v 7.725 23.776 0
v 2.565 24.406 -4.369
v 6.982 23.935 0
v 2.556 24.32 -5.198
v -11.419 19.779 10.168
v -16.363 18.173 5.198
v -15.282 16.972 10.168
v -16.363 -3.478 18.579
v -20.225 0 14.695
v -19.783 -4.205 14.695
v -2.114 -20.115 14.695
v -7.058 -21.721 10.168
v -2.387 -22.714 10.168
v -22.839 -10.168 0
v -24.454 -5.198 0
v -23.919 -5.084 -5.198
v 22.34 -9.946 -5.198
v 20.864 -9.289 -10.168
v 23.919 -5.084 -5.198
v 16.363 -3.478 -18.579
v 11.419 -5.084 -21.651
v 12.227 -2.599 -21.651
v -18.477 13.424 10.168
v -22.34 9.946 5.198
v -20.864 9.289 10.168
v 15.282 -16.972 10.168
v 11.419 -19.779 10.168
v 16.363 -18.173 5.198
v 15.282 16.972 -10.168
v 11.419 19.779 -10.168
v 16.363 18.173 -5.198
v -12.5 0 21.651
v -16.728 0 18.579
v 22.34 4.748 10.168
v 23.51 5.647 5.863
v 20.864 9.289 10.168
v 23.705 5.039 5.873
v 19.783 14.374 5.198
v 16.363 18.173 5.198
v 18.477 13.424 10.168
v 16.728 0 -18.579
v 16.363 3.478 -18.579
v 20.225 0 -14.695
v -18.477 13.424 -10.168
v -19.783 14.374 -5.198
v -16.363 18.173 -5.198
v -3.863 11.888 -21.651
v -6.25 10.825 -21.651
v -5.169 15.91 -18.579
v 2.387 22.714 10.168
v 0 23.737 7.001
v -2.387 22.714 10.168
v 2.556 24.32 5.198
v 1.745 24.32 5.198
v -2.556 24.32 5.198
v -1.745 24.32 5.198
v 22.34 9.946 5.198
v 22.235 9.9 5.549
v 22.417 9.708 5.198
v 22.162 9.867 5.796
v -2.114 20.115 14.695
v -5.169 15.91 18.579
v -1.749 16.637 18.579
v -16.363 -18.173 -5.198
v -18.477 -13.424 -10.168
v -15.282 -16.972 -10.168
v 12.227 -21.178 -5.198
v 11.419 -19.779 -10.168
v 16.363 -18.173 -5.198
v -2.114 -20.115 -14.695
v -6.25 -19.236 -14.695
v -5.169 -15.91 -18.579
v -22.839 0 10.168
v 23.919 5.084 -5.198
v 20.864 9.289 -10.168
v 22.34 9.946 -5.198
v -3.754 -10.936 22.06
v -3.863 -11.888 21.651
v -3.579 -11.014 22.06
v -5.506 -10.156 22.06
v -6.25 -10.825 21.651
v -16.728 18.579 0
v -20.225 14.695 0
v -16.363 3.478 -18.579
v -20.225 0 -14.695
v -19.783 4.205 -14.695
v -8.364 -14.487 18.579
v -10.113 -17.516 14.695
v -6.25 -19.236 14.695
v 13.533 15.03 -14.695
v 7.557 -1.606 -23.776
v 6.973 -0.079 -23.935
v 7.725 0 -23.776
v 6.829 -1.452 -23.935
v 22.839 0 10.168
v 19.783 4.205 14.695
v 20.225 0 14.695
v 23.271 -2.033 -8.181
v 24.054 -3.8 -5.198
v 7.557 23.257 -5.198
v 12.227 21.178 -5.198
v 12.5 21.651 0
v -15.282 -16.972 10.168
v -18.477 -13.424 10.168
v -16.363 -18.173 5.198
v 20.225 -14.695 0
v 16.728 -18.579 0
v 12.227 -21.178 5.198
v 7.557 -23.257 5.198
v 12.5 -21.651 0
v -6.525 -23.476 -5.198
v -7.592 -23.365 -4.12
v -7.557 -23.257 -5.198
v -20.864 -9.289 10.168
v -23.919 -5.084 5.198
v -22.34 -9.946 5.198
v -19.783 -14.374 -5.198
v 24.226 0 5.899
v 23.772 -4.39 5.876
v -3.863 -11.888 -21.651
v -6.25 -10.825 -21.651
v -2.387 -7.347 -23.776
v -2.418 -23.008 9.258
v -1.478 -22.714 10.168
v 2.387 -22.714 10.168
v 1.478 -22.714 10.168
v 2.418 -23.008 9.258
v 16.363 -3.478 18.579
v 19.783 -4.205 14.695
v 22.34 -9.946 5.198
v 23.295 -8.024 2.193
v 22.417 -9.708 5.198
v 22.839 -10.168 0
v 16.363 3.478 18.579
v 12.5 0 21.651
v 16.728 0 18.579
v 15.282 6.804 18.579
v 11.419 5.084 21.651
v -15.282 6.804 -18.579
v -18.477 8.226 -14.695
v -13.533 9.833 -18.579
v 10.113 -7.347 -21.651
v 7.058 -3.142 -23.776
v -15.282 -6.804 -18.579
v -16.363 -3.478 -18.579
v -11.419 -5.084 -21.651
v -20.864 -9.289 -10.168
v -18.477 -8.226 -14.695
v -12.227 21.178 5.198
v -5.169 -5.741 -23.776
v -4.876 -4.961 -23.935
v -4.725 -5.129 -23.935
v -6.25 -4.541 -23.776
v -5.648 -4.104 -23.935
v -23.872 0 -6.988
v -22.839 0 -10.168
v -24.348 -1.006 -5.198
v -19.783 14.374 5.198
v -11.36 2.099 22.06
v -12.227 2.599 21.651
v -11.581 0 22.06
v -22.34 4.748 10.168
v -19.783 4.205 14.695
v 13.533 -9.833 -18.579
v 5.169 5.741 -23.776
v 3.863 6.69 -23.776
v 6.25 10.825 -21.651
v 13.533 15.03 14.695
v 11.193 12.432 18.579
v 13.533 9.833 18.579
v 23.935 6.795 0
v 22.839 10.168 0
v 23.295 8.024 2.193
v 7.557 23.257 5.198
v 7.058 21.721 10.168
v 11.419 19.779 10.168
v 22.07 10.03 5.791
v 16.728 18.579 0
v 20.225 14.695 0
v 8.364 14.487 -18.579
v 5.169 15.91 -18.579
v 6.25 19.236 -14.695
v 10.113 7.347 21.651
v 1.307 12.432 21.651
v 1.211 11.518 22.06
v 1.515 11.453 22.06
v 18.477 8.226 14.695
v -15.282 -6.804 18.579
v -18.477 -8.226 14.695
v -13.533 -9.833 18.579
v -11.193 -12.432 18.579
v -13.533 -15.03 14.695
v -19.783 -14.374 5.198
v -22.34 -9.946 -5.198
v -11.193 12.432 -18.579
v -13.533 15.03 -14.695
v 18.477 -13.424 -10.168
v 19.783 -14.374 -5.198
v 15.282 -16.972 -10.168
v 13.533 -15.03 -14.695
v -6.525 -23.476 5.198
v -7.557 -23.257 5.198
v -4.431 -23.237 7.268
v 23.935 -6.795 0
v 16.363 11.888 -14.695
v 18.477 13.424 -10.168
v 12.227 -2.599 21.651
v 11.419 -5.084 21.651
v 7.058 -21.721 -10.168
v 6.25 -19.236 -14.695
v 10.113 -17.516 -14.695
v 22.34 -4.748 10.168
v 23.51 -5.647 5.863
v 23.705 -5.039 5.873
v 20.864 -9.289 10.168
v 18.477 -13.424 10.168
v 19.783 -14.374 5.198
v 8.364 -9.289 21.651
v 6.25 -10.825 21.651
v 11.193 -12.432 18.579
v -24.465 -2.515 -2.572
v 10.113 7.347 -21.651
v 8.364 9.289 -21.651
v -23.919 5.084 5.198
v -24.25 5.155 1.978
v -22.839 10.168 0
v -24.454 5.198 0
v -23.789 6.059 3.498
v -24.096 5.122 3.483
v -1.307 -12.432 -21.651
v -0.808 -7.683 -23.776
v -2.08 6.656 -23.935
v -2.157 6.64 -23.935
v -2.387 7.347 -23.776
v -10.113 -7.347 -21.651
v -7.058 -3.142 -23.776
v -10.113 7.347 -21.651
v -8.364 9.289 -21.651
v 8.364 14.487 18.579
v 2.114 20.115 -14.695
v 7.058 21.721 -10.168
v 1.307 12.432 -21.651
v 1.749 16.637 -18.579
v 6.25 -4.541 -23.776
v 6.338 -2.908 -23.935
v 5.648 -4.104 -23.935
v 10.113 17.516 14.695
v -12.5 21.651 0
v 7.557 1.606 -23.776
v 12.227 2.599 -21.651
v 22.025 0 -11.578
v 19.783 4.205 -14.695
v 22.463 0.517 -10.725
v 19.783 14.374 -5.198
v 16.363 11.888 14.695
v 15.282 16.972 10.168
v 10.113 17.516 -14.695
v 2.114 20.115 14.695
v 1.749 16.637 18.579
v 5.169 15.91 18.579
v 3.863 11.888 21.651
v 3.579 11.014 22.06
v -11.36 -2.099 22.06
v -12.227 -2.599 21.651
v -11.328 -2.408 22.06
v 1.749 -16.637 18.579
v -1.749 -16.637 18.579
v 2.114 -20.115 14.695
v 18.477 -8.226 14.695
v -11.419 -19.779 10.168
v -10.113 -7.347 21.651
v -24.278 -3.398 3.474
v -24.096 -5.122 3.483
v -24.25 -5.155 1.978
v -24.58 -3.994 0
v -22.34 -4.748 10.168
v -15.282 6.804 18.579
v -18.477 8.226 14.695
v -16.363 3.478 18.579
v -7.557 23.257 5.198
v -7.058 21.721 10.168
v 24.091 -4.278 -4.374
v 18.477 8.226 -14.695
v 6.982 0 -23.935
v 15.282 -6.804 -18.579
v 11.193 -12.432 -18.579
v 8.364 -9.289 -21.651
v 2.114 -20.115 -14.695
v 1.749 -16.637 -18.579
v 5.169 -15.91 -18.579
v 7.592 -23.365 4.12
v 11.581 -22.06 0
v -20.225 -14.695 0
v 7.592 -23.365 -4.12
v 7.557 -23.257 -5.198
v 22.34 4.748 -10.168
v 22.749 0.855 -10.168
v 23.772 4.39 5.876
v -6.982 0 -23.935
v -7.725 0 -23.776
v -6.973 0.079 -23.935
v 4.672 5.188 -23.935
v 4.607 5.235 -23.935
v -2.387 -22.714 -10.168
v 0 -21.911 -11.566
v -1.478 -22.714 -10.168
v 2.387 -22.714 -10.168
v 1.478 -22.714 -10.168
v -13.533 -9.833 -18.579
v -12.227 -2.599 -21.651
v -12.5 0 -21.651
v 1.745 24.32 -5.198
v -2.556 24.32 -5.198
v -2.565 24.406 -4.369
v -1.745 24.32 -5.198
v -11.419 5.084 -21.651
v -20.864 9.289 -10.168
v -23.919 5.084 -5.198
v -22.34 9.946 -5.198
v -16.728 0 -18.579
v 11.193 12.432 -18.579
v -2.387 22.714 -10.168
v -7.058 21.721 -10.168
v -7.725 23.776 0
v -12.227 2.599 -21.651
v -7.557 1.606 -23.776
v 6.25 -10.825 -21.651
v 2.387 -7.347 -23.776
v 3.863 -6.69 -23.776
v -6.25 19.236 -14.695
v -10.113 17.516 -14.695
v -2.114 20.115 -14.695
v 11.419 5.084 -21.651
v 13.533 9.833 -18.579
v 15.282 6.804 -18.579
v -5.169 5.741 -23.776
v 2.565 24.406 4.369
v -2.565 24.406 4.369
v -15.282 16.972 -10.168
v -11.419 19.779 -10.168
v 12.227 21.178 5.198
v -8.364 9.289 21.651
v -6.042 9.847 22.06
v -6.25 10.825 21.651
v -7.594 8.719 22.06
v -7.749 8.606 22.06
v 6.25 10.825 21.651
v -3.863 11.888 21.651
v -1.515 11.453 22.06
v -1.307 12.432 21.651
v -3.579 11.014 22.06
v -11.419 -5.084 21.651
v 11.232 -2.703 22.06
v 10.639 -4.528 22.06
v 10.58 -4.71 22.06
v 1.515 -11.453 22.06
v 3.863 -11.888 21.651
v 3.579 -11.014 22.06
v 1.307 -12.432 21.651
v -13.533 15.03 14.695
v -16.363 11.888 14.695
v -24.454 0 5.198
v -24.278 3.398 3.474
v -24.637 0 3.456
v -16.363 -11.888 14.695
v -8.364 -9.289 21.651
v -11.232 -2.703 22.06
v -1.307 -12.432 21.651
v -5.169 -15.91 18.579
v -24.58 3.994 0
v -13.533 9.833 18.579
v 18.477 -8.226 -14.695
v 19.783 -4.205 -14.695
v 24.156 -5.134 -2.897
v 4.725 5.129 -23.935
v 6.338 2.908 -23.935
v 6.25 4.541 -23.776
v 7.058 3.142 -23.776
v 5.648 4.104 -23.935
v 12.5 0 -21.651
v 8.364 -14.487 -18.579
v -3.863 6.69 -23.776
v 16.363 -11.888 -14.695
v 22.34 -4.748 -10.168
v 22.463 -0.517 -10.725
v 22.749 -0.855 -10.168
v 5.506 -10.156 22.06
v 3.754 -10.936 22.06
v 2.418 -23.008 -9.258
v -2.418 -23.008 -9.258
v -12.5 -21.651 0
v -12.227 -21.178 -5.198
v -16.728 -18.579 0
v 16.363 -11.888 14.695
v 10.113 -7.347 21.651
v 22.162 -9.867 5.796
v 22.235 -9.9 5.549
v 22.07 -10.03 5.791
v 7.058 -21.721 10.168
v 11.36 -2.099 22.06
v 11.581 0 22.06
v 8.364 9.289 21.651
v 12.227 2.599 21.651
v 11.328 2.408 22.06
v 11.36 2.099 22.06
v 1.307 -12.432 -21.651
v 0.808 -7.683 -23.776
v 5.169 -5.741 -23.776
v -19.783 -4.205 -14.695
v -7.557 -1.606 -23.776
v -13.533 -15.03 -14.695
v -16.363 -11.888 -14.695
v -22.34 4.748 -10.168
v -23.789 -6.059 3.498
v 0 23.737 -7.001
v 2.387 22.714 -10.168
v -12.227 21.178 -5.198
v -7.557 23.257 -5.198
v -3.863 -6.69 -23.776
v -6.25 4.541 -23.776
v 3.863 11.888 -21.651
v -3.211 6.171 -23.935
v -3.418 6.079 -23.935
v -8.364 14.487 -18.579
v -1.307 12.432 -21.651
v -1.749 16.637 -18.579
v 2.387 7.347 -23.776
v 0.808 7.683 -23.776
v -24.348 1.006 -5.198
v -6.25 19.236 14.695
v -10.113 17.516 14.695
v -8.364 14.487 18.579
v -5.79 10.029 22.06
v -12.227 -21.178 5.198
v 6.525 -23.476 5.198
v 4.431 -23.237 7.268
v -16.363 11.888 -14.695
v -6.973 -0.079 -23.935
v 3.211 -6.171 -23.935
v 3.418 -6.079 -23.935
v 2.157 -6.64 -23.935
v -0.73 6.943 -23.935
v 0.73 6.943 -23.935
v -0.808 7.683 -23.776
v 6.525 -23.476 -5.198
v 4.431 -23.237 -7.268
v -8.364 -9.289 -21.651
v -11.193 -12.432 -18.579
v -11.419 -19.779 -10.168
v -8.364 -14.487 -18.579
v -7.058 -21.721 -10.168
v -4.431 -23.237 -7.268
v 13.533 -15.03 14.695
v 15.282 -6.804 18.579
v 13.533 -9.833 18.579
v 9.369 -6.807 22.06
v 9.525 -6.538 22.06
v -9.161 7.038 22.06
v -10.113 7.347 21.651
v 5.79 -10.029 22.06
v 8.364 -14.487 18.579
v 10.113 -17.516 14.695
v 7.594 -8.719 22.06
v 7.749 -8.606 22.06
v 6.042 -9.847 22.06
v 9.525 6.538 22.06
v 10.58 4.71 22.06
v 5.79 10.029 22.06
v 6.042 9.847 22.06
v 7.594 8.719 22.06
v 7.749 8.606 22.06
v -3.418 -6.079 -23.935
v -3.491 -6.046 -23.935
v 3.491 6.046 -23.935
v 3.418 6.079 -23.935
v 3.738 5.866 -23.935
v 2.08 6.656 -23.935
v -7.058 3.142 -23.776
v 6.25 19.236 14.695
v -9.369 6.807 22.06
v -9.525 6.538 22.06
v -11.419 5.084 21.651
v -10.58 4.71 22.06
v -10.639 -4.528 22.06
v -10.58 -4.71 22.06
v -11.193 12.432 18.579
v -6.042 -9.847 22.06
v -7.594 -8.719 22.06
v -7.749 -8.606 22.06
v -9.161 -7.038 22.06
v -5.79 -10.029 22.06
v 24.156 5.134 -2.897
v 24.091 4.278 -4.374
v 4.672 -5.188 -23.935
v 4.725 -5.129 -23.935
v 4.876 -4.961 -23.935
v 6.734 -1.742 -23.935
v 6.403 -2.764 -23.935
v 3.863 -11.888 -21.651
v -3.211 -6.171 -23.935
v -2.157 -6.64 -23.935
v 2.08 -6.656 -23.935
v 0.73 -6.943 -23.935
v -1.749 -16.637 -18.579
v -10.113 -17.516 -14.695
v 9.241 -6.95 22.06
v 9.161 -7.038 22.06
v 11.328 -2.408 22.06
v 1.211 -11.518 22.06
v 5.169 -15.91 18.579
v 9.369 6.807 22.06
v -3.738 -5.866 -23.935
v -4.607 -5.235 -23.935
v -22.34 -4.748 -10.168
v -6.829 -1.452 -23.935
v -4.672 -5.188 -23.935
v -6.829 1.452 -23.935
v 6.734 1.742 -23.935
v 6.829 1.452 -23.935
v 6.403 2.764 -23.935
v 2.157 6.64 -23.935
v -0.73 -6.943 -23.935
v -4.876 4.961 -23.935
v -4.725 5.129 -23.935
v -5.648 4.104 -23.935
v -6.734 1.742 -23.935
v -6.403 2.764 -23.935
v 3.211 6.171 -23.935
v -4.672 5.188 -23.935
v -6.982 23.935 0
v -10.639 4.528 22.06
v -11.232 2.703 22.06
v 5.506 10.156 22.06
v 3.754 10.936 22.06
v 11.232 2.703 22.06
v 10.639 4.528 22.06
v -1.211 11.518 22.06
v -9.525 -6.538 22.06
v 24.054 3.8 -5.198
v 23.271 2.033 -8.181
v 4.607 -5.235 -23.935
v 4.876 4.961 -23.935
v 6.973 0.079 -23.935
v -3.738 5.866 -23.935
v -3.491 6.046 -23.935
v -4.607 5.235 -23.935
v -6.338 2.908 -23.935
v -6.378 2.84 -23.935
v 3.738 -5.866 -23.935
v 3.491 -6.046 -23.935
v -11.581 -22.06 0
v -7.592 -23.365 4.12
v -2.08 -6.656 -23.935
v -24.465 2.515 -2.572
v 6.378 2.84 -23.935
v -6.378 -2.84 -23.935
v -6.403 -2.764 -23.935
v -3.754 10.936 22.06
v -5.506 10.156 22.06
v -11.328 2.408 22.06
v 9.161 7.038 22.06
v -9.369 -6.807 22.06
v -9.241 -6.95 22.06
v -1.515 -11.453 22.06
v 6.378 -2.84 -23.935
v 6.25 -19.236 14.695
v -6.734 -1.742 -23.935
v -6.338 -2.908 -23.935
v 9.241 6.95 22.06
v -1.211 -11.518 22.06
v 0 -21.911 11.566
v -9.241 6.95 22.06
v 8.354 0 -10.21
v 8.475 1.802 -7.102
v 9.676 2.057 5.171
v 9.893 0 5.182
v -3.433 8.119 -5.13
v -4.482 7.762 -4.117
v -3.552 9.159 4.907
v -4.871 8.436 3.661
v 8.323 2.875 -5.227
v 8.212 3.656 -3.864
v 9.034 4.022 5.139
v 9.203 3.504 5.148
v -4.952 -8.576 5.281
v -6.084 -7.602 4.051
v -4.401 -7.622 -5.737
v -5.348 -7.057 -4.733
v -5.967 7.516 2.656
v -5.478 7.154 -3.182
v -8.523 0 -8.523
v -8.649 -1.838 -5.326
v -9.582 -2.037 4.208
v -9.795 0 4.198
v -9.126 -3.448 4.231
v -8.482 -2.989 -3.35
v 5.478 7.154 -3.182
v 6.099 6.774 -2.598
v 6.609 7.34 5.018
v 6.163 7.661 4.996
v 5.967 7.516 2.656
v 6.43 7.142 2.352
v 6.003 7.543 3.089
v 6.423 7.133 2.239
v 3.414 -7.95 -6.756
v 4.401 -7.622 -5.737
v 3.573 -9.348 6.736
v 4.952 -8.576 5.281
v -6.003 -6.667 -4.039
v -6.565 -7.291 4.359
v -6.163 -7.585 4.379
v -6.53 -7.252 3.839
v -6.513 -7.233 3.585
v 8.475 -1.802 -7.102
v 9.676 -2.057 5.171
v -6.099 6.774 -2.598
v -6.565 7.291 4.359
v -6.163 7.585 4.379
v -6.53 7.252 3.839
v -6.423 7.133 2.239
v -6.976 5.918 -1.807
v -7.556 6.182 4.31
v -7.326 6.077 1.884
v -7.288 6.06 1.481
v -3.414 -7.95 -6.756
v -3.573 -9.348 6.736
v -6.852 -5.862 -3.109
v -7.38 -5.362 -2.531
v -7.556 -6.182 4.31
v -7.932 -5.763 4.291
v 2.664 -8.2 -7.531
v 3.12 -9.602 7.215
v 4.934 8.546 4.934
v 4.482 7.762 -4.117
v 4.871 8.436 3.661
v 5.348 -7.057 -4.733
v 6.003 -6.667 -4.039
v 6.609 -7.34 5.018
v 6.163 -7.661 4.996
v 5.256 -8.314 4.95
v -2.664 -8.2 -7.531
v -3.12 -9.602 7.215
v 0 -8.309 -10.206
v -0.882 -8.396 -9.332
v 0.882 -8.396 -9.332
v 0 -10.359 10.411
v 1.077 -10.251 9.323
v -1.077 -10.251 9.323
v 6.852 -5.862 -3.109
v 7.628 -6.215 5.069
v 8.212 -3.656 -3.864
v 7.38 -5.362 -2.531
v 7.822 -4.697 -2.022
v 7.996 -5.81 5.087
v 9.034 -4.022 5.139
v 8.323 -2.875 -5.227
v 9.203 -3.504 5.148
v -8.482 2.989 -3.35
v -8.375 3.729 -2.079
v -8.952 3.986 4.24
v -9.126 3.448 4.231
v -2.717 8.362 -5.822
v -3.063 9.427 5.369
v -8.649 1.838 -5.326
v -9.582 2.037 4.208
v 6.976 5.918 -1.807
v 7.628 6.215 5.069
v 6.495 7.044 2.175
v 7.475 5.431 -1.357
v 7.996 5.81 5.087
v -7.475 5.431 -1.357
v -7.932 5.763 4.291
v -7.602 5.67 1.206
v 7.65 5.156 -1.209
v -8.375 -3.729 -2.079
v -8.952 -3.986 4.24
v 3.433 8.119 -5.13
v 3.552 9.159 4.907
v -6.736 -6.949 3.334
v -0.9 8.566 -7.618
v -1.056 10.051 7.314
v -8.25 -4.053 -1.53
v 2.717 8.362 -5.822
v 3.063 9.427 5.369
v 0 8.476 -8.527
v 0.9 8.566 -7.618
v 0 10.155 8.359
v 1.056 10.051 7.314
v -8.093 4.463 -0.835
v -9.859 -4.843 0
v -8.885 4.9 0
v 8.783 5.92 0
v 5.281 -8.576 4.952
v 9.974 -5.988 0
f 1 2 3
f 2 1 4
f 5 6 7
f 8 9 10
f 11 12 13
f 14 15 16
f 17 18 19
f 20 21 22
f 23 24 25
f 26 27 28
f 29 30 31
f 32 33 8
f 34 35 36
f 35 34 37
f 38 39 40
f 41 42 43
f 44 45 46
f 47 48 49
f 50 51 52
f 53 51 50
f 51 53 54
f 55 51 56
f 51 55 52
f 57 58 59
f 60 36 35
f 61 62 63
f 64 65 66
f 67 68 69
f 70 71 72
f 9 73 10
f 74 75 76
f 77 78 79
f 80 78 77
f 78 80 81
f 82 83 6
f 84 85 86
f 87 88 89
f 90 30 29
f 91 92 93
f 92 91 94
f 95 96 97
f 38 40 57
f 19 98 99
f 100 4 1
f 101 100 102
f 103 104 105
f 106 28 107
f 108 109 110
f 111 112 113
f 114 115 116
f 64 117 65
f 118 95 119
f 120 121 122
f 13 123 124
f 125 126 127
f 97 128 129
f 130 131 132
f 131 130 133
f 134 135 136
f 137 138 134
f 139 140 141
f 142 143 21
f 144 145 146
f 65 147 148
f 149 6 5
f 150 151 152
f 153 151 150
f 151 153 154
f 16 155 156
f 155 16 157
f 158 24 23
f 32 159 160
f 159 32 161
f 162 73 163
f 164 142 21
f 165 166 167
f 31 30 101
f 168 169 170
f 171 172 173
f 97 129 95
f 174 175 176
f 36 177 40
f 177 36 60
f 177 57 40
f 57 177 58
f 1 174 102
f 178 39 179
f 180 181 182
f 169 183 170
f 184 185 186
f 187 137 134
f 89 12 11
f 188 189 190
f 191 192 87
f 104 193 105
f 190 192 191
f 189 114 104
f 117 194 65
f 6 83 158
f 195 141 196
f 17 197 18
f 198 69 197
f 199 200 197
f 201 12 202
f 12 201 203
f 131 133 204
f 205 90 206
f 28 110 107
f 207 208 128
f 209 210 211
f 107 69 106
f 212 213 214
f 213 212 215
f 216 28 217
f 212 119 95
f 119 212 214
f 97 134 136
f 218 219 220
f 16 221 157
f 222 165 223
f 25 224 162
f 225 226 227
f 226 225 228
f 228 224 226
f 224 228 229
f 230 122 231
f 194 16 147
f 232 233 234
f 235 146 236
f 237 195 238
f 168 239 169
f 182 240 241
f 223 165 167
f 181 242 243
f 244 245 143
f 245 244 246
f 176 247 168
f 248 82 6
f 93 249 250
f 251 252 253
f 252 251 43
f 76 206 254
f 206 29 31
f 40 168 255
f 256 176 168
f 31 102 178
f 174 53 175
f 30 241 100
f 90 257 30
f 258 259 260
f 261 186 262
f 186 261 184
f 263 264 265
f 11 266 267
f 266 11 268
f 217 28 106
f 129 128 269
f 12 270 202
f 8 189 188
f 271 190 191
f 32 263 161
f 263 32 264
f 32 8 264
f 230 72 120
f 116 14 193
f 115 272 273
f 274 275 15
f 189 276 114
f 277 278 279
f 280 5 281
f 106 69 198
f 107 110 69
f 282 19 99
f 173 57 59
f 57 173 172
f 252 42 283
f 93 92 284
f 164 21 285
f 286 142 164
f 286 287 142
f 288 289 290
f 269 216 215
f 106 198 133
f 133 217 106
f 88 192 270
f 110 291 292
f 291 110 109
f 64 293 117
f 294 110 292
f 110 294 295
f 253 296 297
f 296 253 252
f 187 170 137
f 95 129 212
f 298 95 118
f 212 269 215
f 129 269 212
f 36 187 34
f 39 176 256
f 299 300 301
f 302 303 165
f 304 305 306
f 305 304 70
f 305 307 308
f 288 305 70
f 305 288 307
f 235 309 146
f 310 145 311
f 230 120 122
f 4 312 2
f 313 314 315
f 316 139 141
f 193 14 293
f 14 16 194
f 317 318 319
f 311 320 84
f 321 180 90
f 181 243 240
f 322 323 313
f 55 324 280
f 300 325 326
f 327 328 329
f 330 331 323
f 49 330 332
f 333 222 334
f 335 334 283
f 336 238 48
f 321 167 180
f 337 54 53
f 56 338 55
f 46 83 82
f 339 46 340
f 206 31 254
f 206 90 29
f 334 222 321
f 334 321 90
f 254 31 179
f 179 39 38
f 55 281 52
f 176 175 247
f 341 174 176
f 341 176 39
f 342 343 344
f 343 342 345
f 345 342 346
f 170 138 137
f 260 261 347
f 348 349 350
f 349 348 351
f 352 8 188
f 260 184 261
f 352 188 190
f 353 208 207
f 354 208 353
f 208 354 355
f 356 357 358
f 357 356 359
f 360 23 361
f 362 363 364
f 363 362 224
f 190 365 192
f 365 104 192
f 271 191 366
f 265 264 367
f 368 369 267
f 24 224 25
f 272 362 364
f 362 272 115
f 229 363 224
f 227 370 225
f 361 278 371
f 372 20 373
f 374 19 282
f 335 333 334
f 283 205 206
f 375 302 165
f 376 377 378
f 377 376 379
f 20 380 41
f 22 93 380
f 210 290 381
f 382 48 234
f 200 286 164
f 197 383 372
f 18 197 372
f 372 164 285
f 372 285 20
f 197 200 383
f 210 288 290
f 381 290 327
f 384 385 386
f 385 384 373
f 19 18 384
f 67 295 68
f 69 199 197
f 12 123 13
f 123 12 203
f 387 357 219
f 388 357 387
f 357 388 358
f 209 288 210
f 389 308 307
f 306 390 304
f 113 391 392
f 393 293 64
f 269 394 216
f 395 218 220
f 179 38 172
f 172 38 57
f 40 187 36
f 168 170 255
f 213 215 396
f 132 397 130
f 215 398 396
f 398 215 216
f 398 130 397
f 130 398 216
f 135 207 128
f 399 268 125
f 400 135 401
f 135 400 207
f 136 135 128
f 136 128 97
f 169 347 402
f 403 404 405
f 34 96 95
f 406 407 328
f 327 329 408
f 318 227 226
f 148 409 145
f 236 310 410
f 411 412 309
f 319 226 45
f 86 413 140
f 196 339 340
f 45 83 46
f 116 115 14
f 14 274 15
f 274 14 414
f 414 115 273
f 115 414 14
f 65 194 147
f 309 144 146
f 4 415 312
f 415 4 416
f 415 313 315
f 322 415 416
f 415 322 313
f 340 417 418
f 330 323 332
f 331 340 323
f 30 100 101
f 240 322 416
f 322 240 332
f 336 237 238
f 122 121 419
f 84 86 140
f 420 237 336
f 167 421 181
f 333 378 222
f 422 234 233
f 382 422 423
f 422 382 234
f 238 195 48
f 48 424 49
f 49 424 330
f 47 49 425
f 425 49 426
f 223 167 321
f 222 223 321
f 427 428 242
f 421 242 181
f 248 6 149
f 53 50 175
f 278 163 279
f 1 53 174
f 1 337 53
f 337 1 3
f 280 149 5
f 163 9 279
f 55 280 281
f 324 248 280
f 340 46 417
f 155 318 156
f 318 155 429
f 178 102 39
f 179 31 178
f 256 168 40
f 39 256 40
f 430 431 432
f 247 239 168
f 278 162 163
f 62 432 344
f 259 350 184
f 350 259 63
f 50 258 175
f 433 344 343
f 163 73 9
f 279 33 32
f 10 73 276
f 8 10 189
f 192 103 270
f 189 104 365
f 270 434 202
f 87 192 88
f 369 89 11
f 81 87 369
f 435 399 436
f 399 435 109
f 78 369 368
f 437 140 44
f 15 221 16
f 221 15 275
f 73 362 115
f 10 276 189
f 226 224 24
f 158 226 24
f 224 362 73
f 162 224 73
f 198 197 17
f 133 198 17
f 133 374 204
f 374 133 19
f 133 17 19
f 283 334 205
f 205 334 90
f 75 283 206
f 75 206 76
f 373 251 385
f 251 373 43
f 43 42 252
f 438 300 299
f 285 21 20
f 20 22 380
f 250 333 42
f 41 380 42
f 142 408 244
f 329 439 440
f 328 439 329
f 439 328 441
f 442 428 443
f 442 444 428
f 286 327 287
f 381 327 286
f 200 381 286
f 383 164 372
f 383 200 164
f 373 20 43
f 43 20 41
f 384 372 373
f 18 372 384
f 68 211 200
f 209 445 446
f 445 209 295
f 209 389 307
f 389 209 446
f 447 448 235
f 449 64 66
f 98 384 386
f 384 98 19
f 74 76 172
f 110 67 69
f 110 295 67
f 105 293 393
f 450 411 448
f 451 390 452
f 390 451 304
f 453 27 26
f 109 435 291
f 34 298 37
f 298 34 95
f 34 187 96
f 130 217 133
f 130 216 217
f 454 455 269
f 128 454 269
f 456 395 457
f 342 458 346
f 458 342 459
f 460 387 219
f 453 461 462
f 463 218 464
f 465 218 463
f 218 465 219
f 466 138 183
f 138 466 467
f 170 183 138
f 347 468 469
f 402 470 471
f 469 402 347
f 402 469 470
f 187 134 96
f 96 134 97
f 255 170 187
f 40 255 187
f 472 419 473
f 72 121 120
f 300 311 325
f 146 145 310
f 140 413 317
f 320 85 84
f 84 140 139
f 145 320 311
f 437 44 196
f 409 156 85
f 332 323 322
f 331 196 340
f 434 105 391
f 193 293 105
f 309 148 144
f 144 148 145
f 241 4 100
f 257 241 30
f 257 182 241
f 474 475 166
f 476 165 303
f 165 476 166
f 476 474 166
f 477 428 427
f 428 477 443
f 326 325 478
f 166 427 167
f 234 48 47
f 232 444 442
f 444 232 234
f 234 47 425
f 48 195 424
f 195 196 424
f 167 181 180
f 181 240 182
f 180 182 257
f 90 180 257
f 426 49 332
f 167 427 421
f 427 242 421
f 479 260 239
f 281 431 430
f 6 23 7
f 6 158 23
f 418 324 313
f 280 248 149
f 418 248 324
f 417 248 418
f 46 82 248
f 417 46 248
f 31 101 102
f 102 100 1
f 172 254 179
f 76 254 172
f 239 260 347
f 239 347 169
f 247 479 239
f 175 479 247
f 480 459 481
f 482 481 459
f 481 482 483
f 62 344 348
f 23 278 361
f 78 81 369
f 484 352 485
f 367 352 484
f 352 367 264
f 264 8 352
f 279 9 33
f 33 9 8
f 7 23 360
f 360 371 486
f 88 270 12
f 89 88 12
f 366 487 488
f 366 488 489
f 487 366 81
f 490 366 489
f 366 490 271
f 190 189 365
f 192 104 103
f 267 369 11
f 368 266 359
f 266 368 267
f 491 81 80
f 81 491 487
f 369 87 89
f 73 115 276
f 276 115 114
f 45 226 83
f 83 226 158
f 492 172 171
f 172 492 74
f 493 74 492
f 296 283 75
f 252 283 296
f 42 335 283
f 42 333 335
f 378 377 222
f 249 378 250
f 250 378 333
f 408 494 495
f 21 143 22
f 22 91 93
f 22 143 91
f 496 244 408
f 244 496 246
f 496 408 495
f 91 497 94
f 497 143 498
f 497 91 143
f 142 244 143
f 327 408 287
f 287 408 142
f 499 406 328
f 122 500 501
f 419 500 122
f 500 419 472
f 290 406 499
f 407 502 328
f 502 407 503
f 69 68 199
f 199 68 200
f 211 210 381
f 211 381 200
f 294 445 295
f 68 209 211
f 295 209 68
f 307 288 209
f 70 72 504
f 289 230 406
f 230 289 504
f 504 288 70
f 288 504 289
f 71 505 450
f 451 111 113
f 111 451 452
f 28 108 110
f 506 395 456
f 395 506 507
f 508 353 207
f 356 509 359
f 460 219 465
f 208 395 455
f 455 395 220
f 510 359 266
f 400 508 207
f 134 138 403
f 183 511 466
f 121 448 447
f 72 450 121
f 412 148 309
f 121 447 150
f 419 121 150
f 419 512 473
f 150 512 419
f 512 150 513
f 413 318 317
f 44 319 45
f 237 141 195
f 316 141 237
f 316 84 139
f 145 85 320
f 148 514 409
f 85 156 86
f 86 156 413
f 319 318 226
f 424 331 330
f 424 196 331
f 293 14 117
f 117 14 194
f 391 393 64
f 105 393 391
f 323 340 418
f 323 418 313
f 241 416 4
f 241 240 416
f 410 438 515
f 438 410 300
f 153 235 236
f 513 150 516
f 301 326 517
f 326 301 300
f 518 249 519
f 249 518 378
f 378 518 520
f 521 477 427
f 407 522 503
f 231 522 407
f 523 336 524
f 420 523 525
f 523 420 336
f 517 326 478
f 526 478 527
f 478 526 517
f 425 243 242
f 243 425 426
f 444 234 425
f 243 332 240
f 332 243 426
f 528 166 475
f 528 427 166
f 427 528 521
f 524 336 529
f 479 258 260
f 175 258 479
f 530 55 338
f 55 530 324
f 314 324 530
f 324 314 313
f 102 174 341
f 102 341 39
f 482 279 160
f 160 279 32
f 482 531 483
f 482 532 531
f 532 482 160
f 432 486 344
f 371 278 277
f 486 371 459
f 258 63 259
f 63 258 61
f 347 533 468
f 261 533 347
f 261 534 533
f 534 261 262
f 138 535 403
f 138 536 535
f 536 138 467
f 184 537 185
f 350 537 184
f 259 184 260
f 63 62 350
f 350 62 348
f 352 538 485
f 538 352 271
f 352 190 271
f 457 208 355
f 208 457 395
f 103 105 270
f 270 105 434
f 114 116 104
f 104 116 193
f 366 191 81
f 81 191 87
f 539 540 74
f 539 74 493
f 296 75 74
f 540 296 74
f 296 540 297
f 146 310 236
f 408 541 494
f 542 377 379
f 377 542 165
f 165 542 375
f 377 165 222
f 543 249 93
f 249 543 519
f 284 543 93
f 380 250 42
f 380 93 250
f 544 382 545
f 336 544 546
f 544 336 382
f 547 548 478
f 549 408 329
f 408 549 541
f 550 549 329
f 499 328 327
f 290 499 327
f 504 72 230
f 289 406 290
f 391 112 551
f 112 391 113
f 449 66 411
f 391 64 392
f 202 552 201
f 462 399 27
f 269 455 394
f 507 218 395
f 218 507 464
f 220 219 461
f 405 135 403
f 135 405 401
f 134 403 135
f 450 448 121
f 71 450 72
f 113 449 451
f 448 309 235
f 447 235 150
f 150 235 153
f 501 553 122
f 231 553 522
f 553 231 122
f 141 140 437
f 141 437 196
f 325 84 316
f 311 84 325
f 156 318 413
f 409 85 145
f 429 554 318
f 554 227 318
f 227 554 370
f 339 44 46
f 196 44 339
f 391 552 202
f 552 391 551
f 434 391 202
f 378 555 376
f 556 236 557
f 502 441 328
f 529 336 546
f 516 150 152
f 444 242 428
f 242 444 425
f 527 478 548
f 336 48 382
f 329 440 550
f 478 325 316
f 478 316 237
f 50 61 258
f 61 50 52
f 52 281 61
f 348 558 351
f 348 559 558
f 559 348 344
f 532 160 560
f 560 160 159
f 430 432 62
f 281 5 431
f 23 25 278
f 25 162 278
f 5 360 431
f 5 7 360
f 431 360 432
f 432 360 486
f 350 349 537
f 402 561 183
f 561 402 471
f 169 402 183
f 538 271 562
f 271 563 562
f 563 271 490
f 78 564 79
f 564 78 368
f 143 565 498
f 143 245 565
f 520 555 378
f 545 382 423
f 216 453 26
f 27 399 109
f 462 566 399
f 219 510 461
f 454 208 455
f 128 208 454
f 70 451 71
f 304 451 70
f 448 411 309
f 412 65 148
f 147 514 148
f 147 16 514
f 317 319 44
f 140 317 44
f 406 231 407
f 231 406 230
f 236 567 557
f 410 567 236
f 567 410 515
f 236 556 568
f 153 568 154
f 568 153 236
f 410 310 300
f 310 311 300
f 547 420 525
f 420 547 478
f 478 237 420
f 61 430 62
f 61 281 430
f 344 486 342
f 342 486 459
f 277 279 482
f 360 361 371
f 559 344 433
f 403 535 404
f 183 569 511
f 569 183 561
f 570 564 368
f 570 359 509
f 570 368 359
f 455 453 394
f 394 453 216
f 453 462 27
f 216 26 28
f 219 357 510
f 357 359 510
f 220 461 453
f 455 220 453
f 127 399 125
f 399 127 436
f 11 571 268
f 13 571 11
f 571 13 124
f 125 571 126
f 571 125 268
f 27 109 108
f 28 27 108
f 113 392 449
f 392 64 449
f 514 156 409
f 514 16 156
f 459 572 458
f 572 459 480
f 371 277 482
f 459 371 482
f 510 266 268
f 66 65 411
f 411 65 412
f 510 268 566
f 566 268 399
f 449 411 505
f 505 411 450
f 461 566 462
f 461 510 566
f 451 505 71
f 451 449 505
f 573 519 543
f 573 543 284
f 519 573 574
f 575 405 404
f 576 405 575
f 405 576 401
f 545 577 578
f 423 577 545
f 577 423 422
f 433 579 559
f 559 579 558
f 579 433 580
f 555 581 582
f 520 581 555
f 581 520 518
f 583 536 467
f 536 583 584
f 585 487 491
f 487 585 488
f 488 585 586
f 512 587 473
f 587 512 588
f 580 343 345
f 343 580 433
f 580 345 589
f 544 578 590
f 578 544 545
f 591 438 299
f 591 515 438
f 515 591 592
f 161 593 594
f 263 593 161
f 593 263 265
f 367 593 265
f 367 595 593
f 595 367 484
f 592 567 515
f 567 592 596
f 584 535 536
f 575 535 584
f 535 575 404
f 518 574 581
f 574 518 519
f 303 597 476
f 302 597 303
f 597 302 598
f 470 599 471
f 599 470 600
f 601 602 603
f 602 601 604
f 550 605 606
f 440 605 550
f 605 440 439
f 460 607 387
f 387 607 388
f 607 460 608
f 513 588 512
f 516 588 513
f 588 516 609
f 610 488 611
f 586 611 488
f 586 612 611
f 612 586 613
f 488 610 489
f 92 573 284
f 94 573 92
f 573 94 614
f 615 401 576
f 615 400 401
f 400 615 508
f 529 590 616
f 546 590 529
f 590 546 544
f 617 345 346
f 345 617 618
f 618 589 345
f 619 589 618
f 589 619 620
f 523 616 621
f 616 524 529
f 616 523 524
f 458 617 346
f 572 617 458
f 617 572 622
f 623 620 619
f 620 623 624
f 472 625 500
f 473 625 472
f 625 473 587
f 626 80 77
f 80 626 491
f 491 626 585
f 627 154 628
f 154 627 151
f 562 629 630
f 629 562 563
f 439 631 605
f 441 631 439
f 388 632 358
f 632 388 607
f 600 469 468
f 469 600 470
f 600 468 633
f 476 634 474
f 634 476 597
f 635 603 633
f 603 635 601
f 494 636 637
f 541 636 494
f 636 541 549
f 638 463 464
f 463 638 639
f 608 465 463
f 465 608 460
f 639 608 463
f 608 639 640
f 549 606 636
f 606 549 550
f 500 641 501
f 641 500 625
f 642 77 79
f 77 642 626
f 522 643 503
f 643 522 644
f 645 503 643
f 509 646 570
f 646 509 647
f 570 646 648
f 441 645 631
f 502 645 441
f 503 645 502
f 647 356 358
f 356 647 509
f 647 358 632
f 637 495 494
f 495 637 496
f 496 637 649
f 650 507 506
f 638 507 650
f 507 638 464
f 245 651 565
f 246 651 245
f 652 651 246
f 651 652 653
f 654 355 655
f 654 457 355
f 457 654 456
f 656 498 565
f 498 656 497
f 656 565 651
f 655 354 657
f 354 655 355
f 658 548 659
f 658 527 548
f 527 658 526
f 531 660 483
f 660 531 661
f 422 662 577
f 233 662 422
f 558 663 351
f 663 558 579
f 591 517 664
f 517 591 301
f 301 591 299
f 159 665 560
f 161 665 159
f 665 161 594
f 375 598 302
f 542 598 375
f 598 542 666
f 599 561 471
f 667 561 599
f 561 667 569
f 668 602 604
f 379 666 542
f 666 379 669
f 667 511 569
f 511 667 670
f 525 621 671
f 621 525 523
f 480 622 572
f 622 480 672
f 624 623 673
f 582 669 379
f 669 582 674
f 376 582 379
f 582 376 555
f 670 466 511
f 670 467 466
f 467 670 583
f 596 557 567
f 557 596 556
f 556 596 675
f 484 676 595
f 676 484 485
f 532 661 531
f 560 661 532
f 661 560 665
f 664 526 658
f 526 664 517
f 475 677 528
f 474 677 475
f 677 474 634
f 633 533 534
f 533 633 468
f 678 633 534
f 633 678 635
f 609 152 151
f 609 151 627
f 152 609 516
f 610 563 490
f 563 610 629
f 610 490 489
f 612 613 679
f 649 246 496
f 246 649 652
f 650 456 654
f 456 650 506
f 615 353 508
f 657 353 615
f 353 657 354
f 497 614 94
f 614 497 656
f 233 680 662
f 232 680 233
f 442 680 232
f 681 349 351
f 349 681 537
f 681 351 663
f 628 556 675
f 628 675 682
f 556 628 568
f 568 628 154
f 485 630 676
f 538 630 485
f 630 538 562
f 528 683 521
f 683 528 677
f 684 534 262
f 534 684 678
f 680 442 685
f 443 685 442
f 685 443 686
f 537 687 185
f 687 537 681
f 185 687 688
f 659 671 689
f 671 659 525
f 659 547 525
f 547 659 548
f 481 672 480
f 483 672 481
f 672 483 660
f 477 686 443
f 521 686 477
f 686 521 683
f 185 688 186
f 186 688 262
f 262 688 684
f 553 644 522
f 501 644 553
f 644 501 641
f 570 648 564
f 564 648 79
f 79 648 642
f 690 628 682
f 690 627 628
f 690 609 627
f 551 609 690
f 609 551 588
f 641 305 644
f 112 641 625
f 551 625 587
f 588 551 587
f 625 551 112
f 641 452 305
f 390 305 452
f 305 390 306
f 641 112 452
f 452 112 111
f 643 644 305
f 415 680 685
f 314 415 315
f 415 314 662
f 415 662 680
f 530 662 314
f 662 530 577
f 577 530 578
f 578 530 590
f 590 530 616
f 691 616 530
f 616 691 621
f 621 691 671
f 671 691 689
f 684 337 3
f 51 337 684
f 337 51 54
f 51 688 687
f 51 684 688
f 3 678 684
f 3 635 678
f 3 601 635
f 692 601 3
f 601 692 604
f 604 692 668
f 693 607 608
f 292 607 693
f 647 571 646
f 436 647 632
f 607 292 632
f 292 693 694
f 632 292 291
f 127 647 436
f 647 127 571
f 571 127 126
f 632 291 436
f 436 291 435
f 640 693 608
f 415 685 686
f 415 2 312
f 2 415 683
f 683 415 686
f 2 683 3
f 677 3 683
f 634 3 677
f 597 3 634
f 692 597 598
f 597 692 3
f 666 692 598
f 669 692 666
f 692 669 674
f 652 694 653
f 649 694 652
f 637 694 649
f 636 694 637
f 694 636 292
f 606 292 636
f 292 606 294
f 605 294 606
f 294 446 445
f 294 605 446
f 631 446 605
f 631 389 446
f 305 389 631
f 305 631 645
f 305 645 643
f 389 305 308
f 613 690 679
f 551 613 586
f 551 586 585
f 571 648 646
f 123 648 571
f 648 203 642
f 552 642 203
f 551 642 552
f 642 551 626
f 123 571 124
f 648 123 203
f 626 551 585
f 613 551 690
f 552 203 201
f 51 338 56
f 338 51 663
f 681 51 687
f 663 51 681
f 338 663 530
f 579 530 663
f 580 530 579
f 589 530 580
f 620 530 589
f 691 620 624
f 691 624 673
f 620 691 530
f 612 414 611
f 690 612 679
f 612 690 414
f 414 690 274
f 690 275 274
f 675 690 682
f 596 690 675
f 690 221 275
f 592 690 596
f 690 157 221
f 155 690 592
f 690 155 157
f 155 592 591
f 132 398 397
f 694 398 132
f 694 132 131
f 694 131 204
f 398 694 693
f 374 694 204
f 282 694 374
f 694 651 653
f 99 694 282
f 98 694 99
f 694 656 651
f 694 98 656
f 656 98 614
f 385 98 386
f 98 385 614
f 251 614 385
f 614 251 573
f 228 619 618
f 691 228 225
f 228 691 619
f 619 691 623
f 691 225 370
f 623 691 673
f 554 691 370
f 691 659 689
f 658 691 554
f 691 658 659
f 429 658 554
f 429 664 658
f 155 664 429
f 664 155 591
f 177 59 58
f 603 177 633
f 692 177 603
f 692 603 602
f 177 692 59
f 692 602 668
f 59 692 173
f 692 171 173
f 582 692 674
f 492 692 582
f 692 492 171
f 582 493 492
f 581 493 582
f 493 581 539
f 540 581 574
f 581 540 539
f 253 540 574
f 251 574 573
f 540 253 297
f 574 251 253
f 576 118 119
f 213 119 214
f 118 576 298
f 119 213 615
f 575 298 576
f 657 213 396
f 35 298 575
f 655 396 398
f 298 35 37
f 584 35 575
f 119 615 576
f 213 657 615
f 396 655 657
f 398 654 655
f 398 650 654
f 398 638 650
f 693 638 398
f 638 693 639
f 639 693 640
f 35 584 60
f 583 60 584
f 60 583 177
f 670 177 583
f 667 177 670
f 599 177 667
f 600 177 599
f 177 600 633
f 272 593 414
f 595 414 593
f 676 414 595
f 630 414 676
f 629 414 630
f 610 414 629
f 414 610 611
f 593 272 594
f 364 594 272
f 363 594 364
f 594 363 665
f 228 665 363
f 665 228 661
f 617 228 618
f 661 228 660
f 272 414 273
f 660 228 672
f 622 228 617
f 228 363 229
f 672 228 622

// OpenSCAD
// copy of example001 used for camera tests

module example001()
{
	function r_from_dia(d) = d / 2;

	module rotcy(rot, r, h) {
		rotate(90, rot)
			cylinder(r1 = r / 2, r2 = r, h = h, center = true);
	}

	difference() {
		sphere(r = r_from_dia(size));
		rotcy([0, 0, 0], cy_r, cy_h);
		rotcy([1, 0, 0], cy_r, cy_h, $fn = 4);
		rotcy([0, 1, 0], cy_r, cy_h, $fn = 3);
	}

	size = 50;
	hole = 25;

	cy_r = r_from_dia(hole);
	cy_h = r_from_dia(size * 2.5);
}

example001();
